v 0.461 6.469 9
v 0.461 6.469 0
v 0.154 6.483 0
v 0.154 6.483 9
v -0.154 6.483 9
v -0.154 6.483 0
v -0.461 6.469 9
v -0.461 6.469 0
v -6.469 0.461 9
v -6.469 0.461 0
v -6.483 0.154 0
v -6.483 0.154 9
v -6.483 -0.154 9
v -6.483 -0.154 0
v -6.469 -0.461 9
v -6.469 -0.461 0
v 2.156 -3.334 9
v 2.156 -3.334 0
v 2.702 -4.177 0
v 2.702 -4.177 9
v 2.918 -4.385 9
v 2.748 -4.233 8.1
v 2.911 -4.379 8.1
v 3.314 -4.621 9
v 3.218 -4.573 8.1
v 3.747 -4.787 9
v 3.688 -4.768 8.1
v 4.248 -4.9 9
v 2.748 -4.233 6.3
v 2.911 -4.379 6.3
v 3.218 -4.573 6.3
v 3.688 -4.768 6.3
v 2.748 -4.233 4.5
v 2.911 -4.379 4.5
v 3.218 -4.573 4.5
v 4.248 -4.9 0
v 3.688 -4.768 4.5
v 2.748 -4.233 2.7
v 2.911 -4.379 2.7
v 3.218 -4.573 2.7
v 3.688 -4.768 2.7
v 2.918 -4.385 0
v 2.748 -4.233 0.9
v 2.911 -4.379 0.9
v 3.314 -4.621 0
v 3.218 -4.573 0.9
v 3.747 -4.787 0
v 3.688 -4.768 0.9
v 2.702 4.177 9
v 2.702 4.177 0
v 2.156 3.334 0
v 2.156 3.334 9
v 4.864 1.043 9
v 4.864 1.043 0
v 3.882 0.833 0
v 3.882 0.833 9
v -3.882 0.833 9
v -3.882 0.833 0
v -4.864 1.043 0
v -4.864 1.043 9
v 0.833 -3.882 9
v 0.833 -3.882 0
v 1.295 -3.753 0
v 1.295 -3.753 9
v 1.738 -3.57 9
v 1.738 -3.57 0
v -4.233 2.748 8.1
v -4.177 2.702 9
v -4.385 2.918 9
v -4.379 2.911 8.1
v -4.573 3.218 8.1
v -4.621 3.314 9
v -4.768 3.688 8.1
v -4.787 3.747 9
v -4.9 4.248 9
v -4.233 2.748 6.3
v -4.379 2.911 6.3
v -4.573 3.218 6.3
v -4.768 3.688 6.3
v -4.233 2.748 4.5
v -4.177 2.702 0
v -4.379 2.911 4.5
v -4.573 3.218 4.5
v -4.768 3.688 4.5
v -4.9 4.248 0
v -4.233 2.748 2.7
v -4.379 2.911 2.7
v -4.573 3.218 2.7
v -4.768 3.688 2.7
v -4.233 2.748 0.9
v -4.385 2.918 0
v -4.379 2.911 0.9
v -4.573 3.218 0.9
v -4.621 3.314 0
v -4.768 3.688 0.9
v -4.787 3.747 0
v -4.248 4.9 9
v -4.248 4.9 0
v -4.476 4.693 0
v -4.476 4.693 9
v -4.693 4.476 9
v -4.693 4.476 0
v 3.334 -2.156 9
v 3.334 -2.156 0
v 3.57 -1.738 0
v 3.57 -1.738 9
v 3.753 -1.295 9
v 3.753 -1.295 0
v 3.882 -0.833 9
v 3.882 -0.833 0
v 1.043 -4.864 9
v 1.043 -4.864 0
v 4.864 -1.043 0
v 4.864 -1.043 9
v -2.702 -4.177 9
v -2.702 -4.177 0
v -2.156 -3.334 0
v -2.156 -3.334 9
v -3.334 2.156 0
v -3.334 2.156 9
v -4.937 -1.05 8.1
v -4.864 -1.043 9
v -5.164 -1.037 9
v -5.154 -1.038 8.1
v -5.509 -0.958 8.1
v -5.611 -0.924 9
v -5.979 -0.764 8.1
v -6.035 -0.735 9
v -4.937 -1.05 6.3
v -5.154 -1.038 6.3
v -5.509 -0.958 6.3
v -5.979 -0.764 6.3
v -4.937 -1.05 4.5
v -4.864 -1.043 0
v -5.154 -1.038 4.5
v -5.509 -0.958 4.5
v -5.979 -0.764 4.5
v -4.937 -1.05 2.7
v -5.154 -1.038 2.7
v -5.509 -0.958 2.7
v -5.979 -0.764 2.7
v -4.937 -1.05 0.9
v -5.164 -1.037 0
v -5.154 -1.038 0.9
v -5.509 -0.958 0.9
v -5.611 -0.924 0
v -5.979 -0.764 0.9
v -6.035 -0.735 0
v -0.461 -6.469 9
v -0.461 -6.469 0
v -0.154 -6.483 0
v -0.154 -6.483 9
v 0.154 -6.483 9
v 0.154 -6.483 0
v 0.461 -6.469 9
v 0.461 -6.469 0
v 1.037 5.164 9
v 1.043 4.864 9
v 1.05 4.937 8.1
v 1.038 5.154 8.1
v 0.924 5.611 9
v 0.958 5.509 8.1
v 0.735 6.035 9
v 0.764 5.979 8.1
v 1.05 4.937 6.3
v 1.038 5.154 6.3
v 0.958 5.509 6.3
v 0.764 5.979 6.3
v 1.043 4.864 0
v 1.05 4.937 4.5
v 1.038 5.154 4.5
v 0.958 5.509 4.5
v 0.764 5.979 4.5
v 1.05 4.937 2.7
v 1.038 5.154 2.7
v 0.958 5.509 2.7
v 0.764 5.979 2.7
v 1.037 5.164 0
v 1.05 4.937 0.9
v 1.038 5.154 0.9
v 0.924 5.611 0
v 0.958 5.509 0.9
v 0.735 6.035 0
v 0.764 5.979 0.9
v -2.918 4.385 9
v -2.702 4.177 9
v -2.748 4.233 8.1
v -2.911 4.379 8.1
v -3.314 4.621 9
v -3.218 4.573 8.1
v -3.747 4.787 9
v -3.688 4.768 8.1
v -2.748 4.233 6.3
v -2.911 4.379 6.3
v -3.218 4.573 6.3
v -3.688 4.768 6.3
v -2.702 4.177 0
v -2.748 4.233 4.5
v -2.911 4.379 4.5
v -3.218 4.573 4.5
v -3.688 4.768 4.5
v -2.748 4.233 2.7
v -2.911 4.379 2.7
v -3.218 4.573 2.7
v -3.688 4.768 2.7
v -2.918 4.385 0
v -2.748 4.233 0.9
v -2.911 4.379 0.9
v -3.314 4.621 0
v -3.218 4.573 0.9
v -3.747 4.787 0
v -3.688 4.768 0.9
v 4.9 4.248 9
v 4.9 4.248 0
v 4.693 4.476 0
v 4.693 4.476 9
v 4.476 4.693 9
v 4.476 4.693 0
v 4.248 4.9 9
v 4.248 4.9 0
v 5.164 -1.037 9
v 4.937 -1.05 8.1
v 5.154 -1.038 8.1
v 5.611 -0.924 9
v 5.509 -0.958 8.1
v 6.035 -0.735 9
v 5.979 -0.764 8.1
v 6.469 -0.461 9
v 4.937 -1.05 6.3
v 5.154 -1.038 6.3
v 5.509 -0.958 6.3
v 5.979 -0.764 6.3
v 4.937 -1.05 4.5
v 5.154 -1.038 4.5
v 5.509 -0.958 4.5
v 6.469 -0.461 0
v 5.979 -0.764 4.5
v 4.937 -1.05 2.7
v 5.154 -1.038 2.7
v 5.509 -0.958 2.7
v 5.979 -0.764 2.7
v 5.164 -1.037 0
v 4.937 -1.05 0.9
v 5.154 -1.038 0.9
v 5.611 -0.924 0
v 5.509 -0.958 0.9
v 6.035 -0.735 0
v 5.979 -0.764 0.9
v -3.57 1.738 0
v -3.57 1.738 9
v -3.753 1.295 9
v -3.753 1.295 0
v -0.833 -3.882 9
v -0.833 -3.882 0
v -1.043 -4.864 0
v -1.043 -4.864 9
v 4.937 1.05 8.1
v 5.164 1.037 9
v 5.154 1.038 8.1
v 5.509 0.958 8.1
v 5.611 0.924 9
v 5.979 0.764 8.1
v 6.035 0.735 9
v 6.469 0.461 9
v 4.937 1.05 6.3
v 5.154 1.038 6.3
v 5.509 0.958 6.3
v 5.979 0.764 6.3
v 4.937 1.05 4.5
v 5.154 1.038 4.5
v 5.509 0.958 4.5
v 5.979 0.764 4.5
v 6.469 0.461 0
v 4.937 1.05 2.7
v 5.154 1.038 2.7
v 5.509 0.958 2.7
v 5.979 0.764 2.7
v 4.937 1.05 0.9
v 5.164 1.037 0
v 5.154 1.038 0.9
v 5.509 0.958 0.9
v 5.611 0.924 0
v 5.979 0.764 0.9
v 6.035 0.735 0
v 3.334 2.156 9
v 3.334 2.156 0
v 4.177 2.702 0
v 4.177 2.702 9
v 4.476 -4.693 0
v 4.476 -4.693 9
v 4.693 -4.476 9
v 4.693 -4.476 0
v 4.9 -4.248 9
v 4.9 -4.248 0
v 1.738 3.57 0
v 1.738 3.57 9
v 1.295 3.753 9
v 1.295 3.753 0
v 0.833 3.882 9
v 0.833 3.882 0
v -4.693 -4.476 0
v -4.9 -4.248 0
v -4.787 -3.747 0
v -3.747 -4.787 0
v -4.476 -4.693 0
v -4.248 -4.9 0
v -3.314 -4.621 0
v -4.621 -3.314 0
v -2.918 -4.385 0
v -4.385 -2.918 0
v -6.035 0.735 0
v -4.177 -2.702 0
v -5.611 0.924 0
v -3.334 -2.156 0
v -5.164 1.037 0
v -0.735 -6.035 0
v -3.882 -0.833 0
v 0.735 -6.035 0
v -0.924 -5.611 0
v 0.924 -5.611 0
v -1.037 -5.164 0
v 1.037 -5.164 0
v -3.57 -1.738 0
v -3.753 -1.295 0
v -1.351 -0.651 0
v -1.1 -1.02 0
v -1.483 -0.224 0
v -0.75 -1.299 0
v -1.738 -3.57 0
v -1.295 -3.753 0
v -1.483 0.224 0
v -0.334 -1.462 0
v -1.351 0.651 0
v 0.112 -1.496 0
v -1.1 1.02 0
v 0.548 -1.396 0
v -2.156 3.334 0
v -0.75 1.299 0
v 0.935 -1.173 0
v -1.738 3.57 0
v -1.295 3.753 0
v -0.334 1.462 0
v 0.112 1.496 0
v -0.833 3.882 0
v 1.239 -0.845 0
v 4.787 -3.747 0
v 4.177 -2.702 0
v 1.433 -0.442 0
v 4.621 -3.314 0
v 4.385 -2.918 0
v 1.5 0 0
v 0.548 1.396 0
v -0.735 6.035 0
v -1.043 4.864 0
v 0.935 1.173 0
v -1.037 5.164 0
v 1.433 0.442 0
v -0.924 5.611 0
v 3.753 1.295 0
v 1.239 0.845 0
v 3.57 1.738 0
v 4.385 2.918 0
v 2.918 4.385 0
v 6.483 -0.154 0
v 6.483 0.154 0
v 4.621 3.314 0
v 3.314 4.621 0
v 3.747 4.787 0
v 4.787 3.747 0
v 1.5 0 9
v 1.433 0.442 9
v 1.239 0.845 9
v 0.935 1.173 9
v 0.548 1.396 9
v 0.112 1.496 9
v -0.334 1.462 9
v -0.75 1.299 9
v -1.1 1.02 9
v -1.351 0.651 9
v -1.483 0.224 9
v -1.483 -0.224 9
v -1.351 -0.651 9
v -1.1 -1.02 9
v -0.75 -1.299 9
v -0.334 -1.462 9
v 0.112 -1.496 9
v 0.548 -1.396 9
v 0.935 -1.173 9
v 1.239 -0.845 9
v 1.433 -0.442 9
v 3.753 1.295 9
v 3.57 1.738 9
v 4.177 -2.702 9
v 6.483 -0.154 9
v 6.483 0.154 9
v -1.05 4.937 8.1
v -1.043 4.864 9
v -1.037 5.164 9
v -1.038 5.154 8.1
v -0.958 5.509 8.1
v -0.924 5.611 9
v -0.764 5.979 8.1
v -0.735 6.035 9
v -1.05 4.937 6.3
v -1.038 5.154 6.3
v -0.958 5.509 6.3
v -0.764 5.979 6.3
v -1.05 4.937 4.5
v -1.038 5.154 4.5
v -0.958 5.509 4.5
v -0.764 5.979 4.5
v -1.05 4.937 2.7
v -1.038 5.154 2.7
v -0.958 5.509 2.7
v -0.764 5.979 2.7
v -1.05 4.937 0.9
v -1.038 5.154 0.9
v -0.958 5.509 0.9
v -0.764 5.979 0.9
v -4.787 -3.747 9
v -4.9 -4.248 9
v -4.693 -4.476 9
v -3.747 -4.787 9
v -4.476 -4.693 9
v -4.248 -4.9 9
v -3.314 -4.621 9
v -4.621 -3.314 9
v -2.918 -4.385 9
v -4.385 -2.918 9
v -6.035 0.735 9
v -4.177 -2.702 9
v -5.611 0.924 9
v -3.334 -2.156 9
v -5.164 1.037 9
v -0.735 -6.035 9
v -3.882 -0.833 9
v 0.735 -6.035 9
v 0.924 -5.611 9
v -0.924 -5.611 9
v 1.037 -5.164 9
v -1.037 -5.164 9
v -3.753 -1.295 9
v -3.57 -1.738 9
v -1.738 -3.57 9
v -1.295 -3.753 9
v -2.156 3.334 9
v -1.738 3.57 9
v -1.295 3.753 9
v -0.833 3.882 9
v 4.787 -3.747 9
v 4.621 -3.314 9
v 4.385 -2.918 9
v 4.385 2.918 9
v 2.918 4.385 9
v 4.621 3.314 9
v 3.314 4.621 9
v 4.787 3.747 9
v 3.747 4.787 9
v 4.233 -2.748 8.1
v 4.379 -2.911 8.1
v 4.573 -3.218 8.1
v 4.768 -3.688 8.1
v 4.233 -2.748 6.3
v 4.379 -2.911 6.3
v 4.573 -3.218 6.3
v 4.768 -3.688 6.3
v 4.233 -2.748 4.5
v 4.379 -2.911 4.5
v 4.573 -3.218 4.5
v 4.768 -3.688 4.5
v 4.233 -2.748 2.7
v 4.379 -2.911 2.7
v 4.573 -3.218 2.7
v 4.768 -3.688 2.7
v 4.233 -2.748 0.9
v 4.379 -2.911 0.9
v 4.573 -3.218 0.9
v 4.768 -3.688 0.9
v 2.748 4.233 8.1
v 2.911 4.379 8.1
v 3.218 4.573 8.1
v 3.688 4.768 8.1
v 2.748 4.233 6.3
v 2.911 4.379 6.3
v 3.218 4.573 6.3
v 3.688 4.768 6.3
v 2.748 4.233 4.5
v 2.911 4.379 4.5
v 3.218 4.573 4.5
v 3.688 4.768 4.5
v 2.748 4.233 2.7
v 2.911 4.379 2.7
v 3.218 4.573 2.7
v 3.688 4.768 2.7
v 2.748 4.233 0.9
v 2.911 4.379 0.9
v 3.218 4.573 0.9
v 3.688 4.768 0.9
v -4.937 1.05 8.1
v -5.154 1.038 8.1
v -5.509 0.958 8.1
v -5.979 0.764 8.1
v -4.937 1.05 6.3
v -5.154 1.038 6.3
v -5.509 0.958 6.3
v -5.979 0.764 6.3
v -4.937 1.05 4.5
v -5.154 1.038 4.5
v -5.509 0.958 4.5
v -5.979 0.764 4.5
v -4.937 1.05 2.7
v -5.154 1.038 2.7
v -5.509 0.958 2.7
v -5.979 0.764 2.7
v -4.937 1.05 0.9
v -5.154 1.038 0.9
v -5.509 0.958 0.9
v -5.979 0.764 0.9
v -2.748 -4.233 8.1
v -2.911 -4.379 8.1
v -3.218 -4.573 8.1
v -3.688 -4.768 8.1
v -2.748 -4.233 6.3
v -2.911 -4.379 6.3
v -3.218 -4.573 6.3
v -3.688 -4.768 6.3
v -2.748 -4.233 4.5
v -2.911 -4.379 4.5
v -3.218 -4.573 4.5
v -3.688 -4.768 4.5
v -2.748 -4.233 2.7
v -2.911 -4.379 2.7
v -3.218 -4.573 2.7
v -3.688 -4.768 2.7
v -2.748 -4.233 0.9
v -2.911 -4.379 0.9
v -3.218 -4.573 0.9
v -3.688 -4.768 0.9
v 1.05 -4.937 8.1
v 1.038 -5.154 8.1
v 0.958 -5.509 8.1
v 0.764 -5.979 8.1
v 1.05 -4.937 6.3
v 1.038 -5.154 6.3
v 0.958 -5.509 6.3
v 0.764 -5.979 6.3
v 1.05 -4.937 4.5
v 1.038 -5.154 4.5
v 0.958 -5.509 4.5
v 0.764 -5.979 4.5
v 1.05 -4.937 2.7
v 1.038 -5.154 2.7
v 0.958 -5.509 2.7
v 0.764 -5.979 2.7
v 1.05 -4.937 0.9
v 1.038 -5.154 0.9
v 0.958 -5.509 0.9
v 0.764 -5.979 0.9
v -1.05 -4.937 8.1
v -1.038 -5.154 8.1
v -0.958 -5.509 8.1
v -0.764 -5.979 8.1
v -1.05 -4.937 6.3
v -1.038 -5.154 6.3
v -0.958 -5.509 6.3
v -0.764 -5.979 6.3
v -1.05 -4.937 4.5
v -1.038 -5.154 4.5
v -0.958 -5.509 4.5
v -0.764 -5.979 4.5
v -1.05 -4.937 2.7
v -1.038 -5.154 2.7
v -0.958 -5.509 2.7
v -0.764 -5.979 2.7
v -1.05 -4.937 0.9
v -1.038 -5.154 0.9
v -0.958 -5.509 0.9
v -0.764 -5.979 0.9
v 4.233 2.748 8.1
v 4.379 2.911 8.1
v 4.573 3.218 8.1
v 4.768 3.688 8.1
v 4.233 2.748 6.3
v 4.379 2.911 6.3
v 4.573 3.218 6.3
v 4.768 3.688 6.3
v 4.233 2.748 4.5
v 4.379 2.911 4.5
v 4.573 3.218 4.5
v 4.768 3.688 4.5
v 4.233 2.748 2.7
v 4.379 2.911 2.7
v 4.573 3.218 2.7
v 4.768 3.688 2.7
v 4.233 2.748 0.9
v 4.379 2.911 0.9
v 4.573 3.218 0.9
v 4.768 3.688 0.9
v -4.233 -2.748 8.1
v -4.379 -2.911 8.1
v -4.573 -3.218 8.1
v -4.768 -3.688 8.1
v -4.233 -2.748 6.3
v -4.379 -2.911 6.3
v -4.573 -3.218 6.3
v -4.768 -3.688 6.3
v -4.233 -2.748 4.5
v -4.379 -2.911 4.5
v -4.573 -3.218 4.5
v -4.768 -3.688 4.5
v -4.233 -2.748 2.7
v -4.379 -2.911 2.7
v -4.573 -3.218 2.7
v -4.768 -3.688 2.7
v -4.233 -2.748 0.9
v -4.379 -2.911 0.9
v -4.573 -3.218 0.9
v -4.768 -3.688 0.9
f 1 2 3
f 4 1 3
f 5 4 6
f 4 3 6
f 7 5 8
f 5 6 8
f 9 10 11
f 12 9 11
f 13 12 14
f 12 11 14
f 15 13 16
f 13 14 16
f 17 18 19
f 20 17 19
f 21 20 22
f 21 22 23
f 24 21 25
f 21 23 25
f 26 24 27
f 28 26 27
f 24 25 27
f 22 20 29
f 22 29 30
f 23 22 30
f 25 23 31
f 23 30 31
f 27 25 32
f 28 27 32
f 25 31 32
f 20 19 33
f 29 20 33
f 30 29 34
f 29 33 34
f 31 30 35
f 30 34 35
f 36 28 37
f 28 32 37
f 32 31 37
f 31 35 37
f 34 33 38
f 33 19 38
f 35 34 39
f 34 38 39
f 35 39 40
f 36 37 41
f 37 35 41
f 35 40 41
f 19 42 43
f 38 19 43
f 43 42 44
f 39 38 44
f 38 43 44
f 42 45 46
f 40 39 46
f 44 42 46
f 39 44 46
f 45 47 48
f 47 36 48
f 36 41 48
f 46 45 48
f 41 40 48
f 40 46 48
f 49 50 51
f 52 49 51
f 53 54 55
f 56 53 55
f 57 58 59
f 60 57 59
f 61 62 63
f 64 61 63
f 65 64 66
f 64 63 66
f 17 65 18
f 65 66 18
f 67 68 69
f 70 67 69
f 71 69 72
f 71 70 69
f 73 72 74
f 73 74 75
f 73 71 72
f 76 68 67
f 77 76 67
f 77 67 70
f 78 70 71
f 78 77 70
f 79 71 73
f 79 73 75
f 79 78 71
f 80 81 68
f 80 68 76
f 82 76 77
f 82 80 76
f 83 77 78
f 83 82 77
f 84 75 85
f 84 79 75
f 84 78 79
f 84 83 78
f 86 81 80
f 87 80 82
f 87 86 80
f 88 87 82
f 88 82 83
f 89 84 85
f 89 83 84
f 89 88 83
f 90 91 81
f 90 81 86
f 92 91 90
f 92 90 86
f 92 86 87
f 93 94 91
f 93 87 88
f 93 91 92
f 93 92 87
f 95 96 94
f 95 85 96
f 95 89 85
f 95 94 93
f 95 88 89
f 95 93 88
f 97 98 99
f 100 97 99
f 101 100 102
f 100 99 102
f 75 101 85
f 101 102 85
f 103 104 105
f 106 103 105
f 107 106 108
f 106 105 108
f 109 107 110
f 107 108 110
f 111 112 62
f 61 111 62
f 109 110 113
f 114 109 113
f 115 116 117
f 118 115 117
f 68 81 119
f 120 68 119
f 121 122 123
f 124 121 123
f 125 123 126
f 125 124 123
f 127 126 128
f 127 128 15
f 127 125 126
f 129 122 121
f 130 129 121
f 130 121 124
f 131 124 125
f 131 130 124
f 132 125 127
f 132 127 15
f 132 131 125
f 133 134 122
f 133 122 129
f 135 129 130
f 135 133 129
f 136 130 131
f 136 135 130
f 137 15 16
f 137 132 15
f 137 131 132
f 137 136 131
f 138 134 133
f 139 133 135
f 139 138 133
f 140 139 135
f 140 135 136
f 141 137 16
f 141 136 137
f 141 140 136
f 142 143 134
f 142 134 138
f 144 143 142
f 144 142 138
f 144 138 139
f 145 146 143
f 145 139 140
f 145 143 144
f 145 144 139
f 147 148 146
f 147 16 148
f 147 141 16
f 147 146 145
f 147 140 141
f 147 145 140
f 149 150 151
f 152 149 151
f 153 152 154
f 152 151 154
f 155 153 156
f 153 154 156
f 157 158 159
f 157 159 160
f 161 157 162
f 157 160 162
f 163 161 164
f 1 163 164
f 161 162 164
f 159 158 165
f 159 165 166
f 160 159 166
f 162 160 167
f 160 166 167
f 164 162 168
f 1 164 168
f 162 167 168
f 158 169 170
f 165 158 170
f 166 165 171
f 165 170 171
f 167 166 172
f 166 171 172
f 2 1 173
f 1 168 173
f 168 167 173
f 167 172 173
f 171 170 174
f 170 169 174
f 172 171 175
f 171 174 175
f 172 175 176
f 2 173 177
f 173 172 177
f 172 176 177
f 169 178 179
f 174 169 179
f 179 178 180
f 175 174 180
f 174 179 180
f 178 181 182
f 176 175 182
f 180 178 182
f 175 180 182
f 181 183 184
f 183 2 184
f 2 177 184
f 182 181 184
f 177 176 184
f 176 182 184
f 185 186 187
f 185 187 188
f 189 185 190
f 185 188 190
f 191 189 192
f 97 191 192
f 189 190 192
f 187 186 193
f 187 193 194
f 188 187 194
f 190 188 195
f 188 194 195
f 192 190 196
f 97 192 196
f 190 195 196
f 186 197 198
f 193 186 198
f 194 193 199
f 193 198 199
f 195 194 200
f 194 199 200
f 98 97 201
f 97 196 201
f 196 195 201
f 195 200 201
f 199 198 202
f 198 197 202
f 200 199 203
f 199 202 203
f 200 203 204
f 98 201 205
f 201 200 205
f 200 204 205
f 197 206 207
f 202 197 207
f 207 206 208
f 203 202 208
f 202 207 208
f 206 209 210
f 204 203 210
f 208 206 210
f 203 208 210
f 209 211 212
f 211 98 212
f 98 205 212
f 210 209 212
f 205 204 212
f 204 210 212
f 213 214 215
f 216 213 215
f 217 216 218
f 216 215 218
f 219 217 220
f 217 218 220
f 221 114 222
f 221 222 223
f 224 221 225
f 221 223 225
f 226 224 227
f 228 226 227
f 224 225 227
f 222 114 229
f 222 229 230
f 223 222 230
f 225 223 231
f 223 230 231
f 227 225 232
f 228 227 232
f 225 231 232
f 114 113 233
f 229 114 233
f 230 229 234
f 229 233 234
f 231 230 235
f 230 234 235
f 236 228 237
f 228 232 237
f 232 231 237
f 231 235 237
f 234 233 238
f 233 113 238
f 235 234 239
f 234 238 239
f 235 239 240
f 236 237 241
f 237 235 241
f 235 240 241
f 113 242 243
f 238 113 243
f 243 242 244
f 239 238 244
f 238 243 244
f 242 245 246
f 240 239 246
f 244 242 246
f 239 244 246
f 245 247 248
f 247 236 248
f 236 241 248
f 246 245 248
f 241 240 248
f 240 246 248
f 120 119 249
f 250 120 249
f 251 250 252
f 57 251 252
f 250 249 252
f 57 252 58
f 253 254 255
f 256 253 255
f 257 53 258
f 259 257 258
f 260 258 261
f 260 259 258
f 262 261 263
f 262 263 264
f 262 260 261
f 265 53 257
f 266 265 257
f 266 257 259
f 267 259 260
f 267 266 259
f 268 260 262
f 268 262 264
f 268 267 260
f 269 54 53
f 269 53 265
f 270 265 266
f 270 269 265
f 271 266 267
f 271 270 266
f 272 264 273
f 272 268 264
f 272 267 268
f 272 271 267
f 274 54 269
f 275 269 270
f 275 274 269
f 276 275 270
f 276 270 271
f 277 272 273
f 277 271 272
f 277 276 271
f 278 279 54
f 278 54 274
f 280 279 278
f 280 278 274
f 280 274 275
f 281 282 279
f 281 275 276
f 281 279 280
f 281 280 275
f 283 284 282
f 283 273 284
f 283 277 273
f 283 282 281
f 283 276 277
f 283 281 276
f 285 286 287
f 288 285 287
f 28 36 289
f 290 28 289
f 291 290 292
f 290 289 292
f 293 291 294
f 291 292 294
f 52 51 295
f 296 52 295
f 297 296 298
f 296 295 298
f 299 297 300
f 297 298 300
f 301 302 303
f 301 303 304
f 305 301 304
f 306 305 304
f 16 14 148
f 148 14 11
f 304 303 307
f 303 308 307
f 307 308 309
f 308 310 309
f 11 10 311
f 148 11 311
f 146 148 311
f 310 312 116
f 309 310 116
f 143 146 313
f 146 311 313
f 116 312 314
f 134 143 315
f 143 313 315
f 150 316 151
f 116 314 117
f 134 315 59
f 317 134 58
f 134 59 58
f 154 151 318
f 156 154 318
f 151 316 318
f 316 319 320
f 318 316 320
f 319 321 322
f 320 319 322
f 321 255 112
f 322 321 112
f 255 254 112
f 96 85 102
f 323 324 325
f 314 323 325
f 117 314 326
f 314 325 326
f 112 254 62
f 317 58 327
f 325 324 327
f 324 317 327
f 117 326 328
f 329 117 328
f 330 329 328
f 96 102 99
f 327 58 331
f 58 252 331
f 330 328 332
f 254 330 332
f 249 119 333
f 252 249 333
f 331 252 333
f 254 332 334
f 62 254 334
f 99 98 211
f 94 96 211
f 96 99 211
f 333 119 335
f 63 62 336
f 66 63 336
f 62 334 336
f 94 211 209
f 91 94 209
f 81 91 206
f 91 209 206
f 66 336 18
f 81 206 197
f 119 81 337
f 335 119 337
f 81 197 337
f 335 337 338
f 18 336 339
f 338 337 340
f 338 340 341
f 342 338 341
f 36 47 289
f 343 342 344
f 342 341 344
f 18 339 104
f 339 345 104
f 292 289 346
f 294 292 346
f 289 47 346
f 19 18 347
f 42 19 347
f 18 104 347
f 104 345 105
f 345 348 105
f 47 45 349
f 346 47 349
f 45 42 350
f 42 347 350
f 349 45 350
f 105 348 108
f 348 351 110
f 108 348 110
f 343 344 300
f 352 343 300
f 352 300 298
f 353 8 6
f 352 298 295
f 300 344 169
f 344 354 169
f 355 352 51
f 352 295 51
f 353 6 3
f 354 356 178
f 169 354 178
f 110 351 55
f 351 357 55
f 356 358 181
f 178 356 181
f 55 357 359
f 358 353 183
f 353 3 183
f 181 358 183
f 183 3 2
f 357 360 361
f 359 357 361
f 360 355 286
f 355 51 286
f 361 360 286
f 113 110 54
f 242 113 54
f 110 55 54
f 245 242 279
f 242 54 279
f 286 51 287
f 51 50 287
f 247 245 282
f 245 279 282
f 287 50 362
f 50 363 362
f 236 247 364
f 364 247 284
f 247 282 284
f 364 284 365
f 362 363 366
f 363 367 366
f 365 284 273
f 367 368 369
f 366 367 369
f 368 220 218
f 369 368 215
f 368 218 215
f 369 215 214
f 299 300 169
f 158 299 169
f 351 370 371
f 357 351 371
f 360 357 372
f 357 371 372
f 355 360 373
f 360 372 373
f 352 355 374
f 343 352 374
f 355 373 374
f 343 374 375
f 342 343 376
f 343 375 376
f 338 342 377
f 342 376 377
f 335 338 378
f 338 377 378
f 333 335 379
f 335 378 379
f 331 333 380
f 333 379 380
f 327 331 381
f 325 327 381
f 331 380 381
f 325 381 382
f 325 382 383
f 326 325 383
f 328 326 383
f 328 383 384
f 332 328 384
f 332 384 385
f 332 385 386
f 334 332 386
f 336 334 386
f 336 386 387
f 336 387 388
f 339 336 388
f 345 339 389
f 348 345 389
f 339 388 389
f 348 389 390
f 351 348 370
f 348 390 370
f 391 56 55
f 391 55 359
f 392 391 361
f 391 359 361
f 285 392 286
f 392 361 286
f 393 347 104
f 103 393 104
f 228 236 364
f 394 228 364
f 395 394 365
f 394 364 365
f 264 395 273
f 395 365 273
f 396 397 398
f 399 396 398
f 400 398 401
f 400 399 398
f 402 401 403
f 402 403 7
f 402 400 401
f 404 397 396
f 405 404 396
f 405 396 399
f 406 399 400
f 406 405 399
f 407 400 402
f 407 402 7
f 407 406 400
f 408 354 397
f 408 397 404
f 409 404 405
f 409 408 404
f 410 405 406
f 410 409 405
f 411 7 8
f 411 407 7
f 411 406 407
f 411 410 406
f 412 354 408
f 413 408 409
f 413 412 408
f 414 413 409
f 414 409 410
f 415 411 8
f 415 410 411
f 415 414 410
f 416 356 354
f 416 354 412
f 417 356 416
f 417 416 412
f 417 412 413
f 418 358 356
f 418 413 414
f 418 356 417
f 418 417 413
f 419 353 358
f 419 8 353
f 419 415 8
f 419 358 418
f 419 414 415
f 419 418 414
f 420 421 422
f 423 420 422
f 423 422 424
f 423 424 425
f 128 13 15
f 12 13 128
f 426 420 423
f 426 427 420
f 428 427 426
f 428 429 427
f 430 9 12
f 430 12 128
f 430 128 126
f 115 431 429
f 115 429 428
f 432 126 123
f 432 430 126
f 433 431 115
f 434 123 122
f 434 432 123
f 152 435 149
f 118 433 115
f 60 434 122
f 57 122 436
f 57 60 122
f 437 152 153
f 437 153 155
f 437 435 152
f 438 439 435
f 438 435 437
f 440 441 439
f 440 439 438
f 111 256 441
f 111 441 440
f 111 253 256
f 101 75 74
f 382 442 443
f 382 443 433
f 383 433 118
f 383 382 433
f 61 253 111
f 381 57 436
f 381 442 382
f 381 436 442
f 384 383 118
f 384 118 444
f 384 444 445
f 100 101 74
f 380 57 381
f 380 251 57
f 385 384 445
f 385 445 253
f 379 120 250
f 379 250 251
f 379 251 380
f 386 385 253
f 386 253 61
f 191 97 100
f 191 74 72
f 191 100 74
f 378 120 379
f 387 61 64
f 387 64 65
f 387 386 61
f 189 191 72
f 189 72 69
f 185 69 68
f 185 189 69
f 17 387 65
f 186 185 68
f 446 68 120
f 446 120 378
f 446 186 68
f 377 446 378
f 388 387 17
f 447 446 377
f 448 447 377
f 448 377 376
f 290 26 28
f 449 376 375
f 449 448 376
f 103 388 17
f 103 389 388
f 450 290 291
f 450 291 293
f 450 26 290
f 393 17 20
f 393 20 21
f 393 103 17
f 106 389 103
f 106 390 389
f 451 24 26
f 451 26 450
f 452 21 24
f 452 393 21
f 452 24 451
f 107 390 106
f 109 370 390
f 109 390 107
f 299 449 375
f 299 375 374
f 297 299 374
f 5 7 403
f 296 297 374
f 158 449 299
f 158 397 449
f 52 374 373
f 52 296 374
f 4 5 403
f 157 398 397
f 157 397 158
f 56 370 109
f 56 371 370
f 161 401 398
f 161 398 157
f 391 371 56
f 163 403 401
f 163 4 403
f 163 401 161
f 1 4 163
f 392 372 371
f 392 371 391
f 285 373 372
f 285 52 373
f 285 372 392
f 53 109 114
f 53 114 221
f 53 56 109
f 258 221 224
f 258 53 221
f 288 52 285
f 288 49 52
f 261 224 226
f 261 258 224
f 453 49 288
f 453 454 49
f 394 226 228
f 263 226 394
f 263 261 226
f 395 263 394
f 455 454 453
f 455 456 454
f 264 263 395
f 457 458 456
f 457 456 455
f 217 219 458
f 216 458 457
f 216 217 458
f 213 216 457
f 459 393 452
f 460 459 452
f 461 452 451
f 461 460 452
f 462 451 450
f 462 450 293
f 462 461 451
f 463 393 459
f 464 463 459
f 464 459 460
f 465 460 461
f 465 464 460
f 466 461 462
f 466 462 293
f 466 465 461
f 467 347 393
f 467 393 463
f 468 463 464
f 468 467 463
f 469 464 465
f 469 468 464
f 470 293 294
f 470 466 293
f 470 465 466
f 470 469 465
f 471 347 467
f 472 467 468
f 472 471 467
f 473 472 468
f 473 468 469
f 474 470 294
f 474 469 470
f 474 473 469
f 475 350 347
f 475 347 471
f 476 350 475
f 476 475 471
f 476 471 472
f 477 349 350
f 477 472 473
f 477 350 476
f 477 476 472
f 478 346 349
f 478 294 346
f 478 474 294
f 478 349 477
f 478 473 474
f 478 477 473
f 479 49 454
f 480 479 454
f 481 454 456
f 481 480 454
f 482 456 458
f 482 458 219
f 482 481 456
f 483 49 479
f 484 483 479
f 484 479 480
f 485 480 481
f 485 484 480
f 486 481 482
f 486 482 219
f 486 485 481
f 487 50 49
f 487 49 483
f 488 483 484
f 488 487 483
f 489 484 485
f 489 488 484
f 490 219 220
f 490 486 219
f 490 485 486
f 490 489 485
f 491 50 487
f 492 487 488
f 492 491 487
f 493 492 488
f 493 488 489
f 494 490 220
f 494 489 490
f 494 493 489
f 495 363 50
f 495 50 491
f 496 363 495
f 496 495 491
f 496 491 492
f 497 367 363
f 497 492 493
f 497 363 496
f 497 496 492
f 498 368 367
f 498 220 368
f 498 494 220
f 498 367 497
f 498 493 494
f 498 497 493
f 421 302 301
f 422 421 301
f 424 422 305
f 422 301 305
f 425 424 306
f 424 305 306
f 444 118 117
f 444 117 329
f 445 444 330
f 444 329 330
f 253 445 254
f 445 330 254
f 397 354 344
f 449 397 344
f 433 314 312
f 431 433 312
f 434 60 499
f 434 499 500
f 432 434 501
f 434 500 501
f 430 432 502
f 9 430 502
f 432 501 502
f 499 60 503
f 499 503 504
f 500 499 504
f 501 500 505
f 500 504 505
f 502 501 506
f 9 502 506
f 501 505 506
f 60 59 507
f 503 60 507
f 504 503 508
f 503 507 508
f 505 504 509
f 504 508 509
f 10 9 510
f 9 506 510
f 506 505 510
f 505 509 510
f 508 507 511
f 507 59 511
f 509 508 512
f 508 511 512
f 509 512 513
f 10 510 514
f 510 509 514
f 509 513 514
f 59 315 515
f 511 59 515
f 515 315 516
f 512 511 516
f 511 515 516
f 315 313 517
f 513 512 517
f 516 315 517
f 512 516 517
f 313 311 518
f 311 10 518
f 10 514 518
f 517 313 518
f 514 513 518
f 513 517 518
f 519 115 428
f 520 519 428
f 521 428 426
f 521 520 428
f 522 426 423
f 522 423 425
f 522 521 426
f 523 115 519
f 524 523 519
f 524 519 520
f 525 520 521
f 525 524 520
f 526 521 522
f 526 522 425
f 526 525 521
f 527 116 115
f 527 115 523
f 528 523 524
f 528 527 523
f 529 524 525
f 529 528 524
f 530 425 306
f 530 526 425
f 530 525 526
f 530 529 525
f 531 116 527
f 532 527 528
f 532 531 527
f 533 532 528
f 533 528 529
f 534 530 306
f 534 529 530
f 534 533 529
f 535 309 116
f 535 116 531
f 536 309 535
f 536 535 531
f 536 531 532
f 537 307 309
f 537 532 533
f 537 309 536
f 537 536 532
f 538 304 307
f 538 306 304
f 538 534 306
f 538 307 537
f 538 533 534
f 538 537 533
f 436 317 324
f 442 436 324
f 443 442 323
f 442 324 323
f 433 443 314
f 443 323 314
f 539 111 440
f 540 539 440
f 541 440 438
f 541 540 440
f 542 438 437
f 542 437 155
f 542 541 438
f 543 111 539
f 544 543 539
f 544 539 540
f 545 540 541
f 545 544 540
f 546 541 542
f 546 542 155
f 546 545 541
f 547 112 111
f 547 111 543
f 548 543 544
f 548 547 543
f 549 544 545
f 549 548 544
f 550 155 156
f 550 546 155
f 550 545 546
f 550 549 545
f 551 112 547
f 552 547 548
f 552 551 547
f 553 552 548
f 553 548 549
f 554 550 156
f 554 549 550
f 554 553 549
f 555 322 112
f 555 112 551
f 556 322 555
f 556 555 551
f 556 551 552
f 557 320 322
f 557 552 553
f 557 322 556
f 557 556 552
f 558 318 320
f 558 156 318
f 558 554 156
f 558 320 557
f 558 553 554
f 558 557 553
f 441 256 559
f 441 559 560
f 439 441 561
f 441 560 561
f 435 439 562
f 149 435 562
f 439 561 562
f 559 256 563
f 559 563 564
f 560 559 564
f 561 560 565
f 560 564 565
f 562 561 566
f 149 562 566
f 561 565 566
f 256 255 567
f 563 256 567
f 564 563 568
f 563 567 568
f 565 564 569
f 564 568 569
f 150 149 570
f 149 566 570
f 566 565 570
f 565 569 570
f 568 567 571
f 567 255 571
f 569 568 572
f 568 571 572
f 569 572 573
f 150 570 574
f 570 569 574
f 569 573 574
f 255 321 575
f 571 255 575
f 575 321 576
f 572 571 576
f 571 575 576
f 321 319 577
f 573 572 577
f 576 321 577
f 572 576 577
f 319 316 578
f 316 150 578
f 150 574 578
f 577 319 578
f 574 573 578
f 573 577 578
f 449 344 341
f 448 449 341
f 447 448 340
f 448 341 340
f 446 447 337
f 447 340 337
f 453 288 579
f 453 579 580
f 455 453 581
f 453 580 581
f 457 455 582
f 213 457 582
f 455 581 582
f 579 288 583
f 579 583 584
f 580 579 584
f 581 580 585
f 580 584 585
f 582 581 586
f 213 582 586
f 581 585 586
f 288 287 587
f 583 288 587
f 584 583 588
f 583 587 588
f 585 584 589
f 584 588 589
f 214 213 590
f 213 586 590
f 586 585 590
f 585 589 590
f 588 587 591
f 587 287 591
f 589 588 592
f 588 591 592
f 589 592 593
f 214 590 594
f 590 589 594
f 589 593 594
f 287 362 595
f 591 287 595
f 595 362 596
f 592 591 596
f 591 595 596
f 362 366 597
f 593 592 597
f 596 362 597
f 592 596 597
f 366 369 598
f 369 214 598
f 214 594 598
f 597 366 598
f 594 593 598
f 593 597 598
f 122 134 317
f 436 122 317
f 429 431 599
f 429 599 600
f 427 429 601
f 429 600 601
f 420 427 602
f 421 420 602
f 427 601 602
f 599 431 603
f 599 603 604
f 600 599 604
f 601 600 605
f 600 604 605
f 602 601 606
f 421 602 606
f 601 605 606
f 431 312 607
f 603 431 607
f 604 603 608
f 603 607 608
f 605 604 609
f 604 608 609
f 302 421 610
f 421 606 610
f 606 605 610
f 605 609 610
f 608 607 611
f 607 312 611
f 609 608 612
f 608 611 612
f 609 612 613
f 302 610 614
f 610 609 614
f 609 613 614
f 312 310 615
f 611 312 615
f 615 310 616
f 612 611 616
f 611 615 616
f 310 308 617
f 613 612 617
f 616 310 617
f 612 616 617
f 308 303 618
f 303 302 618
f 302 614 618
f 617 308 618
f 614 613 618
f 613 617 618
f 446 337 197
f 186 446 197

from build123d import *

# Parameters (mm, degrees)
F2_DEPTH = 9
F3_COUNT = 8
F4_ANGLE = -12.10395829
F5_R     = 1.5
F6_DEPTH = 9


with BuildPart() as f2:
    # F0 (on Top) → F2 (new body)
    with BuildSketch(Plane.XY):
        with BuildLine():
            ThreePointArc((3.6214284351, 1.6281359465), (-3.8823170623, -0.8325772028), (3.9705881895, 0))
            ThreePointArc((3.9705881895, 0), (3.8823170623, 0.8325772028), (3.6214284351, 1.6281359465))
        make_face()
        with BuildLine():
            ThreePointArc((3.6214284351, 1.6281359465), (3.8823170623, 0.8325772028), (3.9705881895, 0))
            Line((3.9705881895, 0), (4.974843229, 0))
            add(Edge.make_bspline(
                [(4.974843229, 0), (4.9801466314, 0.0001925881), (4.9946353816, 0.0007187334), (5.0515091084, 0.007901301), (5.1389720703, 0.0270949003), (5.2611962602, 0.0647089906), (5.4129160811, 0.1262103484), (5.5914935571, 0.2170132856), (5.7925834332, 0.3418264578), (6.0112959876, 0.5056653333), (6.2248108983, 0.6935311725), (6.3607565303, 0.8389400469), (6.4217785849, 0.9054272978)],
                knots=[0, 0, 0, 0, 0.0334564641, 0.0914021433, 0.1662094232, 0.2547225024, 0.3550868593, 0.4660438076, 0.5866667132, 0.7162364887, 0.8541740412, 0.9672633179, 0.9672633179, 0.9672633179, 0.9672633179], degree=3))
            ThreePointArc((6.4217785849, 0.9054272978), (6.3411178656, 1.3598760973), (6.2283392589, 1.8074370975))
            add(Edge.make_bspline(
                [(4.5373727694, 2.0399297793), (4.5422887796, 2.041928782), (4.5557191847, 2.0473900024), (4.6105368383, 2.0641600629), (4.698178928, 2.0825183873), (4.8250787688, 2.0983298636), (4.9886754487, 2.1044492916), (5.1887830997, 2.0948567755), (5.4233693532, 2.0634759551), (5.6900310606, 2.0037273789), (5.961804421, 1.9199333981), (6.1454202376, 1.843055654), (6.2283392589, 1.8074370975)],
                knots=[0, 0, 0, 0, 0.0334564641, 0.0914021433, 0.1662094232, 0.2547225024, 0.3550868593, 0.4660438076, 0.5866667132, 0.7162364887, 0.8541740412, 0.9672633179, 0.9672633179, 0.9672633179, 0.9672633179], degree=3))
            Line((4.5373727694, 2.0399297793), (3.6214284351, 1.6281359465))
        make_face()
    extrude(amount=F2_DEPTH)

    # F3: F2 ×8 about axis
    f3_axis = Axis((0, 0, 12.9622193053), (0, 0, 1))


with BuildPart() as f2_1:
    add(f2.part)
    for i in range(1, F3_COUNT):
        add(f2.part.rotate(f3_axis, i * 360 / F3_COUNT))


with BuildPart() as f2_2:
    # F4: moved
    add(f2_1.part.rotate(Axis((0, 0, 12.9622193053), (0, 0, 1)), F4_ANGLE))

    # F5 (on face) → F6 (cut, through all)
    with BuildSketch(Plane.XY.offset(9)):
        Circle(F5_R)
    extrude(amount=-F6_DEPTH, mode=Mode.SUBTRACT)


solid = f2_2.part
